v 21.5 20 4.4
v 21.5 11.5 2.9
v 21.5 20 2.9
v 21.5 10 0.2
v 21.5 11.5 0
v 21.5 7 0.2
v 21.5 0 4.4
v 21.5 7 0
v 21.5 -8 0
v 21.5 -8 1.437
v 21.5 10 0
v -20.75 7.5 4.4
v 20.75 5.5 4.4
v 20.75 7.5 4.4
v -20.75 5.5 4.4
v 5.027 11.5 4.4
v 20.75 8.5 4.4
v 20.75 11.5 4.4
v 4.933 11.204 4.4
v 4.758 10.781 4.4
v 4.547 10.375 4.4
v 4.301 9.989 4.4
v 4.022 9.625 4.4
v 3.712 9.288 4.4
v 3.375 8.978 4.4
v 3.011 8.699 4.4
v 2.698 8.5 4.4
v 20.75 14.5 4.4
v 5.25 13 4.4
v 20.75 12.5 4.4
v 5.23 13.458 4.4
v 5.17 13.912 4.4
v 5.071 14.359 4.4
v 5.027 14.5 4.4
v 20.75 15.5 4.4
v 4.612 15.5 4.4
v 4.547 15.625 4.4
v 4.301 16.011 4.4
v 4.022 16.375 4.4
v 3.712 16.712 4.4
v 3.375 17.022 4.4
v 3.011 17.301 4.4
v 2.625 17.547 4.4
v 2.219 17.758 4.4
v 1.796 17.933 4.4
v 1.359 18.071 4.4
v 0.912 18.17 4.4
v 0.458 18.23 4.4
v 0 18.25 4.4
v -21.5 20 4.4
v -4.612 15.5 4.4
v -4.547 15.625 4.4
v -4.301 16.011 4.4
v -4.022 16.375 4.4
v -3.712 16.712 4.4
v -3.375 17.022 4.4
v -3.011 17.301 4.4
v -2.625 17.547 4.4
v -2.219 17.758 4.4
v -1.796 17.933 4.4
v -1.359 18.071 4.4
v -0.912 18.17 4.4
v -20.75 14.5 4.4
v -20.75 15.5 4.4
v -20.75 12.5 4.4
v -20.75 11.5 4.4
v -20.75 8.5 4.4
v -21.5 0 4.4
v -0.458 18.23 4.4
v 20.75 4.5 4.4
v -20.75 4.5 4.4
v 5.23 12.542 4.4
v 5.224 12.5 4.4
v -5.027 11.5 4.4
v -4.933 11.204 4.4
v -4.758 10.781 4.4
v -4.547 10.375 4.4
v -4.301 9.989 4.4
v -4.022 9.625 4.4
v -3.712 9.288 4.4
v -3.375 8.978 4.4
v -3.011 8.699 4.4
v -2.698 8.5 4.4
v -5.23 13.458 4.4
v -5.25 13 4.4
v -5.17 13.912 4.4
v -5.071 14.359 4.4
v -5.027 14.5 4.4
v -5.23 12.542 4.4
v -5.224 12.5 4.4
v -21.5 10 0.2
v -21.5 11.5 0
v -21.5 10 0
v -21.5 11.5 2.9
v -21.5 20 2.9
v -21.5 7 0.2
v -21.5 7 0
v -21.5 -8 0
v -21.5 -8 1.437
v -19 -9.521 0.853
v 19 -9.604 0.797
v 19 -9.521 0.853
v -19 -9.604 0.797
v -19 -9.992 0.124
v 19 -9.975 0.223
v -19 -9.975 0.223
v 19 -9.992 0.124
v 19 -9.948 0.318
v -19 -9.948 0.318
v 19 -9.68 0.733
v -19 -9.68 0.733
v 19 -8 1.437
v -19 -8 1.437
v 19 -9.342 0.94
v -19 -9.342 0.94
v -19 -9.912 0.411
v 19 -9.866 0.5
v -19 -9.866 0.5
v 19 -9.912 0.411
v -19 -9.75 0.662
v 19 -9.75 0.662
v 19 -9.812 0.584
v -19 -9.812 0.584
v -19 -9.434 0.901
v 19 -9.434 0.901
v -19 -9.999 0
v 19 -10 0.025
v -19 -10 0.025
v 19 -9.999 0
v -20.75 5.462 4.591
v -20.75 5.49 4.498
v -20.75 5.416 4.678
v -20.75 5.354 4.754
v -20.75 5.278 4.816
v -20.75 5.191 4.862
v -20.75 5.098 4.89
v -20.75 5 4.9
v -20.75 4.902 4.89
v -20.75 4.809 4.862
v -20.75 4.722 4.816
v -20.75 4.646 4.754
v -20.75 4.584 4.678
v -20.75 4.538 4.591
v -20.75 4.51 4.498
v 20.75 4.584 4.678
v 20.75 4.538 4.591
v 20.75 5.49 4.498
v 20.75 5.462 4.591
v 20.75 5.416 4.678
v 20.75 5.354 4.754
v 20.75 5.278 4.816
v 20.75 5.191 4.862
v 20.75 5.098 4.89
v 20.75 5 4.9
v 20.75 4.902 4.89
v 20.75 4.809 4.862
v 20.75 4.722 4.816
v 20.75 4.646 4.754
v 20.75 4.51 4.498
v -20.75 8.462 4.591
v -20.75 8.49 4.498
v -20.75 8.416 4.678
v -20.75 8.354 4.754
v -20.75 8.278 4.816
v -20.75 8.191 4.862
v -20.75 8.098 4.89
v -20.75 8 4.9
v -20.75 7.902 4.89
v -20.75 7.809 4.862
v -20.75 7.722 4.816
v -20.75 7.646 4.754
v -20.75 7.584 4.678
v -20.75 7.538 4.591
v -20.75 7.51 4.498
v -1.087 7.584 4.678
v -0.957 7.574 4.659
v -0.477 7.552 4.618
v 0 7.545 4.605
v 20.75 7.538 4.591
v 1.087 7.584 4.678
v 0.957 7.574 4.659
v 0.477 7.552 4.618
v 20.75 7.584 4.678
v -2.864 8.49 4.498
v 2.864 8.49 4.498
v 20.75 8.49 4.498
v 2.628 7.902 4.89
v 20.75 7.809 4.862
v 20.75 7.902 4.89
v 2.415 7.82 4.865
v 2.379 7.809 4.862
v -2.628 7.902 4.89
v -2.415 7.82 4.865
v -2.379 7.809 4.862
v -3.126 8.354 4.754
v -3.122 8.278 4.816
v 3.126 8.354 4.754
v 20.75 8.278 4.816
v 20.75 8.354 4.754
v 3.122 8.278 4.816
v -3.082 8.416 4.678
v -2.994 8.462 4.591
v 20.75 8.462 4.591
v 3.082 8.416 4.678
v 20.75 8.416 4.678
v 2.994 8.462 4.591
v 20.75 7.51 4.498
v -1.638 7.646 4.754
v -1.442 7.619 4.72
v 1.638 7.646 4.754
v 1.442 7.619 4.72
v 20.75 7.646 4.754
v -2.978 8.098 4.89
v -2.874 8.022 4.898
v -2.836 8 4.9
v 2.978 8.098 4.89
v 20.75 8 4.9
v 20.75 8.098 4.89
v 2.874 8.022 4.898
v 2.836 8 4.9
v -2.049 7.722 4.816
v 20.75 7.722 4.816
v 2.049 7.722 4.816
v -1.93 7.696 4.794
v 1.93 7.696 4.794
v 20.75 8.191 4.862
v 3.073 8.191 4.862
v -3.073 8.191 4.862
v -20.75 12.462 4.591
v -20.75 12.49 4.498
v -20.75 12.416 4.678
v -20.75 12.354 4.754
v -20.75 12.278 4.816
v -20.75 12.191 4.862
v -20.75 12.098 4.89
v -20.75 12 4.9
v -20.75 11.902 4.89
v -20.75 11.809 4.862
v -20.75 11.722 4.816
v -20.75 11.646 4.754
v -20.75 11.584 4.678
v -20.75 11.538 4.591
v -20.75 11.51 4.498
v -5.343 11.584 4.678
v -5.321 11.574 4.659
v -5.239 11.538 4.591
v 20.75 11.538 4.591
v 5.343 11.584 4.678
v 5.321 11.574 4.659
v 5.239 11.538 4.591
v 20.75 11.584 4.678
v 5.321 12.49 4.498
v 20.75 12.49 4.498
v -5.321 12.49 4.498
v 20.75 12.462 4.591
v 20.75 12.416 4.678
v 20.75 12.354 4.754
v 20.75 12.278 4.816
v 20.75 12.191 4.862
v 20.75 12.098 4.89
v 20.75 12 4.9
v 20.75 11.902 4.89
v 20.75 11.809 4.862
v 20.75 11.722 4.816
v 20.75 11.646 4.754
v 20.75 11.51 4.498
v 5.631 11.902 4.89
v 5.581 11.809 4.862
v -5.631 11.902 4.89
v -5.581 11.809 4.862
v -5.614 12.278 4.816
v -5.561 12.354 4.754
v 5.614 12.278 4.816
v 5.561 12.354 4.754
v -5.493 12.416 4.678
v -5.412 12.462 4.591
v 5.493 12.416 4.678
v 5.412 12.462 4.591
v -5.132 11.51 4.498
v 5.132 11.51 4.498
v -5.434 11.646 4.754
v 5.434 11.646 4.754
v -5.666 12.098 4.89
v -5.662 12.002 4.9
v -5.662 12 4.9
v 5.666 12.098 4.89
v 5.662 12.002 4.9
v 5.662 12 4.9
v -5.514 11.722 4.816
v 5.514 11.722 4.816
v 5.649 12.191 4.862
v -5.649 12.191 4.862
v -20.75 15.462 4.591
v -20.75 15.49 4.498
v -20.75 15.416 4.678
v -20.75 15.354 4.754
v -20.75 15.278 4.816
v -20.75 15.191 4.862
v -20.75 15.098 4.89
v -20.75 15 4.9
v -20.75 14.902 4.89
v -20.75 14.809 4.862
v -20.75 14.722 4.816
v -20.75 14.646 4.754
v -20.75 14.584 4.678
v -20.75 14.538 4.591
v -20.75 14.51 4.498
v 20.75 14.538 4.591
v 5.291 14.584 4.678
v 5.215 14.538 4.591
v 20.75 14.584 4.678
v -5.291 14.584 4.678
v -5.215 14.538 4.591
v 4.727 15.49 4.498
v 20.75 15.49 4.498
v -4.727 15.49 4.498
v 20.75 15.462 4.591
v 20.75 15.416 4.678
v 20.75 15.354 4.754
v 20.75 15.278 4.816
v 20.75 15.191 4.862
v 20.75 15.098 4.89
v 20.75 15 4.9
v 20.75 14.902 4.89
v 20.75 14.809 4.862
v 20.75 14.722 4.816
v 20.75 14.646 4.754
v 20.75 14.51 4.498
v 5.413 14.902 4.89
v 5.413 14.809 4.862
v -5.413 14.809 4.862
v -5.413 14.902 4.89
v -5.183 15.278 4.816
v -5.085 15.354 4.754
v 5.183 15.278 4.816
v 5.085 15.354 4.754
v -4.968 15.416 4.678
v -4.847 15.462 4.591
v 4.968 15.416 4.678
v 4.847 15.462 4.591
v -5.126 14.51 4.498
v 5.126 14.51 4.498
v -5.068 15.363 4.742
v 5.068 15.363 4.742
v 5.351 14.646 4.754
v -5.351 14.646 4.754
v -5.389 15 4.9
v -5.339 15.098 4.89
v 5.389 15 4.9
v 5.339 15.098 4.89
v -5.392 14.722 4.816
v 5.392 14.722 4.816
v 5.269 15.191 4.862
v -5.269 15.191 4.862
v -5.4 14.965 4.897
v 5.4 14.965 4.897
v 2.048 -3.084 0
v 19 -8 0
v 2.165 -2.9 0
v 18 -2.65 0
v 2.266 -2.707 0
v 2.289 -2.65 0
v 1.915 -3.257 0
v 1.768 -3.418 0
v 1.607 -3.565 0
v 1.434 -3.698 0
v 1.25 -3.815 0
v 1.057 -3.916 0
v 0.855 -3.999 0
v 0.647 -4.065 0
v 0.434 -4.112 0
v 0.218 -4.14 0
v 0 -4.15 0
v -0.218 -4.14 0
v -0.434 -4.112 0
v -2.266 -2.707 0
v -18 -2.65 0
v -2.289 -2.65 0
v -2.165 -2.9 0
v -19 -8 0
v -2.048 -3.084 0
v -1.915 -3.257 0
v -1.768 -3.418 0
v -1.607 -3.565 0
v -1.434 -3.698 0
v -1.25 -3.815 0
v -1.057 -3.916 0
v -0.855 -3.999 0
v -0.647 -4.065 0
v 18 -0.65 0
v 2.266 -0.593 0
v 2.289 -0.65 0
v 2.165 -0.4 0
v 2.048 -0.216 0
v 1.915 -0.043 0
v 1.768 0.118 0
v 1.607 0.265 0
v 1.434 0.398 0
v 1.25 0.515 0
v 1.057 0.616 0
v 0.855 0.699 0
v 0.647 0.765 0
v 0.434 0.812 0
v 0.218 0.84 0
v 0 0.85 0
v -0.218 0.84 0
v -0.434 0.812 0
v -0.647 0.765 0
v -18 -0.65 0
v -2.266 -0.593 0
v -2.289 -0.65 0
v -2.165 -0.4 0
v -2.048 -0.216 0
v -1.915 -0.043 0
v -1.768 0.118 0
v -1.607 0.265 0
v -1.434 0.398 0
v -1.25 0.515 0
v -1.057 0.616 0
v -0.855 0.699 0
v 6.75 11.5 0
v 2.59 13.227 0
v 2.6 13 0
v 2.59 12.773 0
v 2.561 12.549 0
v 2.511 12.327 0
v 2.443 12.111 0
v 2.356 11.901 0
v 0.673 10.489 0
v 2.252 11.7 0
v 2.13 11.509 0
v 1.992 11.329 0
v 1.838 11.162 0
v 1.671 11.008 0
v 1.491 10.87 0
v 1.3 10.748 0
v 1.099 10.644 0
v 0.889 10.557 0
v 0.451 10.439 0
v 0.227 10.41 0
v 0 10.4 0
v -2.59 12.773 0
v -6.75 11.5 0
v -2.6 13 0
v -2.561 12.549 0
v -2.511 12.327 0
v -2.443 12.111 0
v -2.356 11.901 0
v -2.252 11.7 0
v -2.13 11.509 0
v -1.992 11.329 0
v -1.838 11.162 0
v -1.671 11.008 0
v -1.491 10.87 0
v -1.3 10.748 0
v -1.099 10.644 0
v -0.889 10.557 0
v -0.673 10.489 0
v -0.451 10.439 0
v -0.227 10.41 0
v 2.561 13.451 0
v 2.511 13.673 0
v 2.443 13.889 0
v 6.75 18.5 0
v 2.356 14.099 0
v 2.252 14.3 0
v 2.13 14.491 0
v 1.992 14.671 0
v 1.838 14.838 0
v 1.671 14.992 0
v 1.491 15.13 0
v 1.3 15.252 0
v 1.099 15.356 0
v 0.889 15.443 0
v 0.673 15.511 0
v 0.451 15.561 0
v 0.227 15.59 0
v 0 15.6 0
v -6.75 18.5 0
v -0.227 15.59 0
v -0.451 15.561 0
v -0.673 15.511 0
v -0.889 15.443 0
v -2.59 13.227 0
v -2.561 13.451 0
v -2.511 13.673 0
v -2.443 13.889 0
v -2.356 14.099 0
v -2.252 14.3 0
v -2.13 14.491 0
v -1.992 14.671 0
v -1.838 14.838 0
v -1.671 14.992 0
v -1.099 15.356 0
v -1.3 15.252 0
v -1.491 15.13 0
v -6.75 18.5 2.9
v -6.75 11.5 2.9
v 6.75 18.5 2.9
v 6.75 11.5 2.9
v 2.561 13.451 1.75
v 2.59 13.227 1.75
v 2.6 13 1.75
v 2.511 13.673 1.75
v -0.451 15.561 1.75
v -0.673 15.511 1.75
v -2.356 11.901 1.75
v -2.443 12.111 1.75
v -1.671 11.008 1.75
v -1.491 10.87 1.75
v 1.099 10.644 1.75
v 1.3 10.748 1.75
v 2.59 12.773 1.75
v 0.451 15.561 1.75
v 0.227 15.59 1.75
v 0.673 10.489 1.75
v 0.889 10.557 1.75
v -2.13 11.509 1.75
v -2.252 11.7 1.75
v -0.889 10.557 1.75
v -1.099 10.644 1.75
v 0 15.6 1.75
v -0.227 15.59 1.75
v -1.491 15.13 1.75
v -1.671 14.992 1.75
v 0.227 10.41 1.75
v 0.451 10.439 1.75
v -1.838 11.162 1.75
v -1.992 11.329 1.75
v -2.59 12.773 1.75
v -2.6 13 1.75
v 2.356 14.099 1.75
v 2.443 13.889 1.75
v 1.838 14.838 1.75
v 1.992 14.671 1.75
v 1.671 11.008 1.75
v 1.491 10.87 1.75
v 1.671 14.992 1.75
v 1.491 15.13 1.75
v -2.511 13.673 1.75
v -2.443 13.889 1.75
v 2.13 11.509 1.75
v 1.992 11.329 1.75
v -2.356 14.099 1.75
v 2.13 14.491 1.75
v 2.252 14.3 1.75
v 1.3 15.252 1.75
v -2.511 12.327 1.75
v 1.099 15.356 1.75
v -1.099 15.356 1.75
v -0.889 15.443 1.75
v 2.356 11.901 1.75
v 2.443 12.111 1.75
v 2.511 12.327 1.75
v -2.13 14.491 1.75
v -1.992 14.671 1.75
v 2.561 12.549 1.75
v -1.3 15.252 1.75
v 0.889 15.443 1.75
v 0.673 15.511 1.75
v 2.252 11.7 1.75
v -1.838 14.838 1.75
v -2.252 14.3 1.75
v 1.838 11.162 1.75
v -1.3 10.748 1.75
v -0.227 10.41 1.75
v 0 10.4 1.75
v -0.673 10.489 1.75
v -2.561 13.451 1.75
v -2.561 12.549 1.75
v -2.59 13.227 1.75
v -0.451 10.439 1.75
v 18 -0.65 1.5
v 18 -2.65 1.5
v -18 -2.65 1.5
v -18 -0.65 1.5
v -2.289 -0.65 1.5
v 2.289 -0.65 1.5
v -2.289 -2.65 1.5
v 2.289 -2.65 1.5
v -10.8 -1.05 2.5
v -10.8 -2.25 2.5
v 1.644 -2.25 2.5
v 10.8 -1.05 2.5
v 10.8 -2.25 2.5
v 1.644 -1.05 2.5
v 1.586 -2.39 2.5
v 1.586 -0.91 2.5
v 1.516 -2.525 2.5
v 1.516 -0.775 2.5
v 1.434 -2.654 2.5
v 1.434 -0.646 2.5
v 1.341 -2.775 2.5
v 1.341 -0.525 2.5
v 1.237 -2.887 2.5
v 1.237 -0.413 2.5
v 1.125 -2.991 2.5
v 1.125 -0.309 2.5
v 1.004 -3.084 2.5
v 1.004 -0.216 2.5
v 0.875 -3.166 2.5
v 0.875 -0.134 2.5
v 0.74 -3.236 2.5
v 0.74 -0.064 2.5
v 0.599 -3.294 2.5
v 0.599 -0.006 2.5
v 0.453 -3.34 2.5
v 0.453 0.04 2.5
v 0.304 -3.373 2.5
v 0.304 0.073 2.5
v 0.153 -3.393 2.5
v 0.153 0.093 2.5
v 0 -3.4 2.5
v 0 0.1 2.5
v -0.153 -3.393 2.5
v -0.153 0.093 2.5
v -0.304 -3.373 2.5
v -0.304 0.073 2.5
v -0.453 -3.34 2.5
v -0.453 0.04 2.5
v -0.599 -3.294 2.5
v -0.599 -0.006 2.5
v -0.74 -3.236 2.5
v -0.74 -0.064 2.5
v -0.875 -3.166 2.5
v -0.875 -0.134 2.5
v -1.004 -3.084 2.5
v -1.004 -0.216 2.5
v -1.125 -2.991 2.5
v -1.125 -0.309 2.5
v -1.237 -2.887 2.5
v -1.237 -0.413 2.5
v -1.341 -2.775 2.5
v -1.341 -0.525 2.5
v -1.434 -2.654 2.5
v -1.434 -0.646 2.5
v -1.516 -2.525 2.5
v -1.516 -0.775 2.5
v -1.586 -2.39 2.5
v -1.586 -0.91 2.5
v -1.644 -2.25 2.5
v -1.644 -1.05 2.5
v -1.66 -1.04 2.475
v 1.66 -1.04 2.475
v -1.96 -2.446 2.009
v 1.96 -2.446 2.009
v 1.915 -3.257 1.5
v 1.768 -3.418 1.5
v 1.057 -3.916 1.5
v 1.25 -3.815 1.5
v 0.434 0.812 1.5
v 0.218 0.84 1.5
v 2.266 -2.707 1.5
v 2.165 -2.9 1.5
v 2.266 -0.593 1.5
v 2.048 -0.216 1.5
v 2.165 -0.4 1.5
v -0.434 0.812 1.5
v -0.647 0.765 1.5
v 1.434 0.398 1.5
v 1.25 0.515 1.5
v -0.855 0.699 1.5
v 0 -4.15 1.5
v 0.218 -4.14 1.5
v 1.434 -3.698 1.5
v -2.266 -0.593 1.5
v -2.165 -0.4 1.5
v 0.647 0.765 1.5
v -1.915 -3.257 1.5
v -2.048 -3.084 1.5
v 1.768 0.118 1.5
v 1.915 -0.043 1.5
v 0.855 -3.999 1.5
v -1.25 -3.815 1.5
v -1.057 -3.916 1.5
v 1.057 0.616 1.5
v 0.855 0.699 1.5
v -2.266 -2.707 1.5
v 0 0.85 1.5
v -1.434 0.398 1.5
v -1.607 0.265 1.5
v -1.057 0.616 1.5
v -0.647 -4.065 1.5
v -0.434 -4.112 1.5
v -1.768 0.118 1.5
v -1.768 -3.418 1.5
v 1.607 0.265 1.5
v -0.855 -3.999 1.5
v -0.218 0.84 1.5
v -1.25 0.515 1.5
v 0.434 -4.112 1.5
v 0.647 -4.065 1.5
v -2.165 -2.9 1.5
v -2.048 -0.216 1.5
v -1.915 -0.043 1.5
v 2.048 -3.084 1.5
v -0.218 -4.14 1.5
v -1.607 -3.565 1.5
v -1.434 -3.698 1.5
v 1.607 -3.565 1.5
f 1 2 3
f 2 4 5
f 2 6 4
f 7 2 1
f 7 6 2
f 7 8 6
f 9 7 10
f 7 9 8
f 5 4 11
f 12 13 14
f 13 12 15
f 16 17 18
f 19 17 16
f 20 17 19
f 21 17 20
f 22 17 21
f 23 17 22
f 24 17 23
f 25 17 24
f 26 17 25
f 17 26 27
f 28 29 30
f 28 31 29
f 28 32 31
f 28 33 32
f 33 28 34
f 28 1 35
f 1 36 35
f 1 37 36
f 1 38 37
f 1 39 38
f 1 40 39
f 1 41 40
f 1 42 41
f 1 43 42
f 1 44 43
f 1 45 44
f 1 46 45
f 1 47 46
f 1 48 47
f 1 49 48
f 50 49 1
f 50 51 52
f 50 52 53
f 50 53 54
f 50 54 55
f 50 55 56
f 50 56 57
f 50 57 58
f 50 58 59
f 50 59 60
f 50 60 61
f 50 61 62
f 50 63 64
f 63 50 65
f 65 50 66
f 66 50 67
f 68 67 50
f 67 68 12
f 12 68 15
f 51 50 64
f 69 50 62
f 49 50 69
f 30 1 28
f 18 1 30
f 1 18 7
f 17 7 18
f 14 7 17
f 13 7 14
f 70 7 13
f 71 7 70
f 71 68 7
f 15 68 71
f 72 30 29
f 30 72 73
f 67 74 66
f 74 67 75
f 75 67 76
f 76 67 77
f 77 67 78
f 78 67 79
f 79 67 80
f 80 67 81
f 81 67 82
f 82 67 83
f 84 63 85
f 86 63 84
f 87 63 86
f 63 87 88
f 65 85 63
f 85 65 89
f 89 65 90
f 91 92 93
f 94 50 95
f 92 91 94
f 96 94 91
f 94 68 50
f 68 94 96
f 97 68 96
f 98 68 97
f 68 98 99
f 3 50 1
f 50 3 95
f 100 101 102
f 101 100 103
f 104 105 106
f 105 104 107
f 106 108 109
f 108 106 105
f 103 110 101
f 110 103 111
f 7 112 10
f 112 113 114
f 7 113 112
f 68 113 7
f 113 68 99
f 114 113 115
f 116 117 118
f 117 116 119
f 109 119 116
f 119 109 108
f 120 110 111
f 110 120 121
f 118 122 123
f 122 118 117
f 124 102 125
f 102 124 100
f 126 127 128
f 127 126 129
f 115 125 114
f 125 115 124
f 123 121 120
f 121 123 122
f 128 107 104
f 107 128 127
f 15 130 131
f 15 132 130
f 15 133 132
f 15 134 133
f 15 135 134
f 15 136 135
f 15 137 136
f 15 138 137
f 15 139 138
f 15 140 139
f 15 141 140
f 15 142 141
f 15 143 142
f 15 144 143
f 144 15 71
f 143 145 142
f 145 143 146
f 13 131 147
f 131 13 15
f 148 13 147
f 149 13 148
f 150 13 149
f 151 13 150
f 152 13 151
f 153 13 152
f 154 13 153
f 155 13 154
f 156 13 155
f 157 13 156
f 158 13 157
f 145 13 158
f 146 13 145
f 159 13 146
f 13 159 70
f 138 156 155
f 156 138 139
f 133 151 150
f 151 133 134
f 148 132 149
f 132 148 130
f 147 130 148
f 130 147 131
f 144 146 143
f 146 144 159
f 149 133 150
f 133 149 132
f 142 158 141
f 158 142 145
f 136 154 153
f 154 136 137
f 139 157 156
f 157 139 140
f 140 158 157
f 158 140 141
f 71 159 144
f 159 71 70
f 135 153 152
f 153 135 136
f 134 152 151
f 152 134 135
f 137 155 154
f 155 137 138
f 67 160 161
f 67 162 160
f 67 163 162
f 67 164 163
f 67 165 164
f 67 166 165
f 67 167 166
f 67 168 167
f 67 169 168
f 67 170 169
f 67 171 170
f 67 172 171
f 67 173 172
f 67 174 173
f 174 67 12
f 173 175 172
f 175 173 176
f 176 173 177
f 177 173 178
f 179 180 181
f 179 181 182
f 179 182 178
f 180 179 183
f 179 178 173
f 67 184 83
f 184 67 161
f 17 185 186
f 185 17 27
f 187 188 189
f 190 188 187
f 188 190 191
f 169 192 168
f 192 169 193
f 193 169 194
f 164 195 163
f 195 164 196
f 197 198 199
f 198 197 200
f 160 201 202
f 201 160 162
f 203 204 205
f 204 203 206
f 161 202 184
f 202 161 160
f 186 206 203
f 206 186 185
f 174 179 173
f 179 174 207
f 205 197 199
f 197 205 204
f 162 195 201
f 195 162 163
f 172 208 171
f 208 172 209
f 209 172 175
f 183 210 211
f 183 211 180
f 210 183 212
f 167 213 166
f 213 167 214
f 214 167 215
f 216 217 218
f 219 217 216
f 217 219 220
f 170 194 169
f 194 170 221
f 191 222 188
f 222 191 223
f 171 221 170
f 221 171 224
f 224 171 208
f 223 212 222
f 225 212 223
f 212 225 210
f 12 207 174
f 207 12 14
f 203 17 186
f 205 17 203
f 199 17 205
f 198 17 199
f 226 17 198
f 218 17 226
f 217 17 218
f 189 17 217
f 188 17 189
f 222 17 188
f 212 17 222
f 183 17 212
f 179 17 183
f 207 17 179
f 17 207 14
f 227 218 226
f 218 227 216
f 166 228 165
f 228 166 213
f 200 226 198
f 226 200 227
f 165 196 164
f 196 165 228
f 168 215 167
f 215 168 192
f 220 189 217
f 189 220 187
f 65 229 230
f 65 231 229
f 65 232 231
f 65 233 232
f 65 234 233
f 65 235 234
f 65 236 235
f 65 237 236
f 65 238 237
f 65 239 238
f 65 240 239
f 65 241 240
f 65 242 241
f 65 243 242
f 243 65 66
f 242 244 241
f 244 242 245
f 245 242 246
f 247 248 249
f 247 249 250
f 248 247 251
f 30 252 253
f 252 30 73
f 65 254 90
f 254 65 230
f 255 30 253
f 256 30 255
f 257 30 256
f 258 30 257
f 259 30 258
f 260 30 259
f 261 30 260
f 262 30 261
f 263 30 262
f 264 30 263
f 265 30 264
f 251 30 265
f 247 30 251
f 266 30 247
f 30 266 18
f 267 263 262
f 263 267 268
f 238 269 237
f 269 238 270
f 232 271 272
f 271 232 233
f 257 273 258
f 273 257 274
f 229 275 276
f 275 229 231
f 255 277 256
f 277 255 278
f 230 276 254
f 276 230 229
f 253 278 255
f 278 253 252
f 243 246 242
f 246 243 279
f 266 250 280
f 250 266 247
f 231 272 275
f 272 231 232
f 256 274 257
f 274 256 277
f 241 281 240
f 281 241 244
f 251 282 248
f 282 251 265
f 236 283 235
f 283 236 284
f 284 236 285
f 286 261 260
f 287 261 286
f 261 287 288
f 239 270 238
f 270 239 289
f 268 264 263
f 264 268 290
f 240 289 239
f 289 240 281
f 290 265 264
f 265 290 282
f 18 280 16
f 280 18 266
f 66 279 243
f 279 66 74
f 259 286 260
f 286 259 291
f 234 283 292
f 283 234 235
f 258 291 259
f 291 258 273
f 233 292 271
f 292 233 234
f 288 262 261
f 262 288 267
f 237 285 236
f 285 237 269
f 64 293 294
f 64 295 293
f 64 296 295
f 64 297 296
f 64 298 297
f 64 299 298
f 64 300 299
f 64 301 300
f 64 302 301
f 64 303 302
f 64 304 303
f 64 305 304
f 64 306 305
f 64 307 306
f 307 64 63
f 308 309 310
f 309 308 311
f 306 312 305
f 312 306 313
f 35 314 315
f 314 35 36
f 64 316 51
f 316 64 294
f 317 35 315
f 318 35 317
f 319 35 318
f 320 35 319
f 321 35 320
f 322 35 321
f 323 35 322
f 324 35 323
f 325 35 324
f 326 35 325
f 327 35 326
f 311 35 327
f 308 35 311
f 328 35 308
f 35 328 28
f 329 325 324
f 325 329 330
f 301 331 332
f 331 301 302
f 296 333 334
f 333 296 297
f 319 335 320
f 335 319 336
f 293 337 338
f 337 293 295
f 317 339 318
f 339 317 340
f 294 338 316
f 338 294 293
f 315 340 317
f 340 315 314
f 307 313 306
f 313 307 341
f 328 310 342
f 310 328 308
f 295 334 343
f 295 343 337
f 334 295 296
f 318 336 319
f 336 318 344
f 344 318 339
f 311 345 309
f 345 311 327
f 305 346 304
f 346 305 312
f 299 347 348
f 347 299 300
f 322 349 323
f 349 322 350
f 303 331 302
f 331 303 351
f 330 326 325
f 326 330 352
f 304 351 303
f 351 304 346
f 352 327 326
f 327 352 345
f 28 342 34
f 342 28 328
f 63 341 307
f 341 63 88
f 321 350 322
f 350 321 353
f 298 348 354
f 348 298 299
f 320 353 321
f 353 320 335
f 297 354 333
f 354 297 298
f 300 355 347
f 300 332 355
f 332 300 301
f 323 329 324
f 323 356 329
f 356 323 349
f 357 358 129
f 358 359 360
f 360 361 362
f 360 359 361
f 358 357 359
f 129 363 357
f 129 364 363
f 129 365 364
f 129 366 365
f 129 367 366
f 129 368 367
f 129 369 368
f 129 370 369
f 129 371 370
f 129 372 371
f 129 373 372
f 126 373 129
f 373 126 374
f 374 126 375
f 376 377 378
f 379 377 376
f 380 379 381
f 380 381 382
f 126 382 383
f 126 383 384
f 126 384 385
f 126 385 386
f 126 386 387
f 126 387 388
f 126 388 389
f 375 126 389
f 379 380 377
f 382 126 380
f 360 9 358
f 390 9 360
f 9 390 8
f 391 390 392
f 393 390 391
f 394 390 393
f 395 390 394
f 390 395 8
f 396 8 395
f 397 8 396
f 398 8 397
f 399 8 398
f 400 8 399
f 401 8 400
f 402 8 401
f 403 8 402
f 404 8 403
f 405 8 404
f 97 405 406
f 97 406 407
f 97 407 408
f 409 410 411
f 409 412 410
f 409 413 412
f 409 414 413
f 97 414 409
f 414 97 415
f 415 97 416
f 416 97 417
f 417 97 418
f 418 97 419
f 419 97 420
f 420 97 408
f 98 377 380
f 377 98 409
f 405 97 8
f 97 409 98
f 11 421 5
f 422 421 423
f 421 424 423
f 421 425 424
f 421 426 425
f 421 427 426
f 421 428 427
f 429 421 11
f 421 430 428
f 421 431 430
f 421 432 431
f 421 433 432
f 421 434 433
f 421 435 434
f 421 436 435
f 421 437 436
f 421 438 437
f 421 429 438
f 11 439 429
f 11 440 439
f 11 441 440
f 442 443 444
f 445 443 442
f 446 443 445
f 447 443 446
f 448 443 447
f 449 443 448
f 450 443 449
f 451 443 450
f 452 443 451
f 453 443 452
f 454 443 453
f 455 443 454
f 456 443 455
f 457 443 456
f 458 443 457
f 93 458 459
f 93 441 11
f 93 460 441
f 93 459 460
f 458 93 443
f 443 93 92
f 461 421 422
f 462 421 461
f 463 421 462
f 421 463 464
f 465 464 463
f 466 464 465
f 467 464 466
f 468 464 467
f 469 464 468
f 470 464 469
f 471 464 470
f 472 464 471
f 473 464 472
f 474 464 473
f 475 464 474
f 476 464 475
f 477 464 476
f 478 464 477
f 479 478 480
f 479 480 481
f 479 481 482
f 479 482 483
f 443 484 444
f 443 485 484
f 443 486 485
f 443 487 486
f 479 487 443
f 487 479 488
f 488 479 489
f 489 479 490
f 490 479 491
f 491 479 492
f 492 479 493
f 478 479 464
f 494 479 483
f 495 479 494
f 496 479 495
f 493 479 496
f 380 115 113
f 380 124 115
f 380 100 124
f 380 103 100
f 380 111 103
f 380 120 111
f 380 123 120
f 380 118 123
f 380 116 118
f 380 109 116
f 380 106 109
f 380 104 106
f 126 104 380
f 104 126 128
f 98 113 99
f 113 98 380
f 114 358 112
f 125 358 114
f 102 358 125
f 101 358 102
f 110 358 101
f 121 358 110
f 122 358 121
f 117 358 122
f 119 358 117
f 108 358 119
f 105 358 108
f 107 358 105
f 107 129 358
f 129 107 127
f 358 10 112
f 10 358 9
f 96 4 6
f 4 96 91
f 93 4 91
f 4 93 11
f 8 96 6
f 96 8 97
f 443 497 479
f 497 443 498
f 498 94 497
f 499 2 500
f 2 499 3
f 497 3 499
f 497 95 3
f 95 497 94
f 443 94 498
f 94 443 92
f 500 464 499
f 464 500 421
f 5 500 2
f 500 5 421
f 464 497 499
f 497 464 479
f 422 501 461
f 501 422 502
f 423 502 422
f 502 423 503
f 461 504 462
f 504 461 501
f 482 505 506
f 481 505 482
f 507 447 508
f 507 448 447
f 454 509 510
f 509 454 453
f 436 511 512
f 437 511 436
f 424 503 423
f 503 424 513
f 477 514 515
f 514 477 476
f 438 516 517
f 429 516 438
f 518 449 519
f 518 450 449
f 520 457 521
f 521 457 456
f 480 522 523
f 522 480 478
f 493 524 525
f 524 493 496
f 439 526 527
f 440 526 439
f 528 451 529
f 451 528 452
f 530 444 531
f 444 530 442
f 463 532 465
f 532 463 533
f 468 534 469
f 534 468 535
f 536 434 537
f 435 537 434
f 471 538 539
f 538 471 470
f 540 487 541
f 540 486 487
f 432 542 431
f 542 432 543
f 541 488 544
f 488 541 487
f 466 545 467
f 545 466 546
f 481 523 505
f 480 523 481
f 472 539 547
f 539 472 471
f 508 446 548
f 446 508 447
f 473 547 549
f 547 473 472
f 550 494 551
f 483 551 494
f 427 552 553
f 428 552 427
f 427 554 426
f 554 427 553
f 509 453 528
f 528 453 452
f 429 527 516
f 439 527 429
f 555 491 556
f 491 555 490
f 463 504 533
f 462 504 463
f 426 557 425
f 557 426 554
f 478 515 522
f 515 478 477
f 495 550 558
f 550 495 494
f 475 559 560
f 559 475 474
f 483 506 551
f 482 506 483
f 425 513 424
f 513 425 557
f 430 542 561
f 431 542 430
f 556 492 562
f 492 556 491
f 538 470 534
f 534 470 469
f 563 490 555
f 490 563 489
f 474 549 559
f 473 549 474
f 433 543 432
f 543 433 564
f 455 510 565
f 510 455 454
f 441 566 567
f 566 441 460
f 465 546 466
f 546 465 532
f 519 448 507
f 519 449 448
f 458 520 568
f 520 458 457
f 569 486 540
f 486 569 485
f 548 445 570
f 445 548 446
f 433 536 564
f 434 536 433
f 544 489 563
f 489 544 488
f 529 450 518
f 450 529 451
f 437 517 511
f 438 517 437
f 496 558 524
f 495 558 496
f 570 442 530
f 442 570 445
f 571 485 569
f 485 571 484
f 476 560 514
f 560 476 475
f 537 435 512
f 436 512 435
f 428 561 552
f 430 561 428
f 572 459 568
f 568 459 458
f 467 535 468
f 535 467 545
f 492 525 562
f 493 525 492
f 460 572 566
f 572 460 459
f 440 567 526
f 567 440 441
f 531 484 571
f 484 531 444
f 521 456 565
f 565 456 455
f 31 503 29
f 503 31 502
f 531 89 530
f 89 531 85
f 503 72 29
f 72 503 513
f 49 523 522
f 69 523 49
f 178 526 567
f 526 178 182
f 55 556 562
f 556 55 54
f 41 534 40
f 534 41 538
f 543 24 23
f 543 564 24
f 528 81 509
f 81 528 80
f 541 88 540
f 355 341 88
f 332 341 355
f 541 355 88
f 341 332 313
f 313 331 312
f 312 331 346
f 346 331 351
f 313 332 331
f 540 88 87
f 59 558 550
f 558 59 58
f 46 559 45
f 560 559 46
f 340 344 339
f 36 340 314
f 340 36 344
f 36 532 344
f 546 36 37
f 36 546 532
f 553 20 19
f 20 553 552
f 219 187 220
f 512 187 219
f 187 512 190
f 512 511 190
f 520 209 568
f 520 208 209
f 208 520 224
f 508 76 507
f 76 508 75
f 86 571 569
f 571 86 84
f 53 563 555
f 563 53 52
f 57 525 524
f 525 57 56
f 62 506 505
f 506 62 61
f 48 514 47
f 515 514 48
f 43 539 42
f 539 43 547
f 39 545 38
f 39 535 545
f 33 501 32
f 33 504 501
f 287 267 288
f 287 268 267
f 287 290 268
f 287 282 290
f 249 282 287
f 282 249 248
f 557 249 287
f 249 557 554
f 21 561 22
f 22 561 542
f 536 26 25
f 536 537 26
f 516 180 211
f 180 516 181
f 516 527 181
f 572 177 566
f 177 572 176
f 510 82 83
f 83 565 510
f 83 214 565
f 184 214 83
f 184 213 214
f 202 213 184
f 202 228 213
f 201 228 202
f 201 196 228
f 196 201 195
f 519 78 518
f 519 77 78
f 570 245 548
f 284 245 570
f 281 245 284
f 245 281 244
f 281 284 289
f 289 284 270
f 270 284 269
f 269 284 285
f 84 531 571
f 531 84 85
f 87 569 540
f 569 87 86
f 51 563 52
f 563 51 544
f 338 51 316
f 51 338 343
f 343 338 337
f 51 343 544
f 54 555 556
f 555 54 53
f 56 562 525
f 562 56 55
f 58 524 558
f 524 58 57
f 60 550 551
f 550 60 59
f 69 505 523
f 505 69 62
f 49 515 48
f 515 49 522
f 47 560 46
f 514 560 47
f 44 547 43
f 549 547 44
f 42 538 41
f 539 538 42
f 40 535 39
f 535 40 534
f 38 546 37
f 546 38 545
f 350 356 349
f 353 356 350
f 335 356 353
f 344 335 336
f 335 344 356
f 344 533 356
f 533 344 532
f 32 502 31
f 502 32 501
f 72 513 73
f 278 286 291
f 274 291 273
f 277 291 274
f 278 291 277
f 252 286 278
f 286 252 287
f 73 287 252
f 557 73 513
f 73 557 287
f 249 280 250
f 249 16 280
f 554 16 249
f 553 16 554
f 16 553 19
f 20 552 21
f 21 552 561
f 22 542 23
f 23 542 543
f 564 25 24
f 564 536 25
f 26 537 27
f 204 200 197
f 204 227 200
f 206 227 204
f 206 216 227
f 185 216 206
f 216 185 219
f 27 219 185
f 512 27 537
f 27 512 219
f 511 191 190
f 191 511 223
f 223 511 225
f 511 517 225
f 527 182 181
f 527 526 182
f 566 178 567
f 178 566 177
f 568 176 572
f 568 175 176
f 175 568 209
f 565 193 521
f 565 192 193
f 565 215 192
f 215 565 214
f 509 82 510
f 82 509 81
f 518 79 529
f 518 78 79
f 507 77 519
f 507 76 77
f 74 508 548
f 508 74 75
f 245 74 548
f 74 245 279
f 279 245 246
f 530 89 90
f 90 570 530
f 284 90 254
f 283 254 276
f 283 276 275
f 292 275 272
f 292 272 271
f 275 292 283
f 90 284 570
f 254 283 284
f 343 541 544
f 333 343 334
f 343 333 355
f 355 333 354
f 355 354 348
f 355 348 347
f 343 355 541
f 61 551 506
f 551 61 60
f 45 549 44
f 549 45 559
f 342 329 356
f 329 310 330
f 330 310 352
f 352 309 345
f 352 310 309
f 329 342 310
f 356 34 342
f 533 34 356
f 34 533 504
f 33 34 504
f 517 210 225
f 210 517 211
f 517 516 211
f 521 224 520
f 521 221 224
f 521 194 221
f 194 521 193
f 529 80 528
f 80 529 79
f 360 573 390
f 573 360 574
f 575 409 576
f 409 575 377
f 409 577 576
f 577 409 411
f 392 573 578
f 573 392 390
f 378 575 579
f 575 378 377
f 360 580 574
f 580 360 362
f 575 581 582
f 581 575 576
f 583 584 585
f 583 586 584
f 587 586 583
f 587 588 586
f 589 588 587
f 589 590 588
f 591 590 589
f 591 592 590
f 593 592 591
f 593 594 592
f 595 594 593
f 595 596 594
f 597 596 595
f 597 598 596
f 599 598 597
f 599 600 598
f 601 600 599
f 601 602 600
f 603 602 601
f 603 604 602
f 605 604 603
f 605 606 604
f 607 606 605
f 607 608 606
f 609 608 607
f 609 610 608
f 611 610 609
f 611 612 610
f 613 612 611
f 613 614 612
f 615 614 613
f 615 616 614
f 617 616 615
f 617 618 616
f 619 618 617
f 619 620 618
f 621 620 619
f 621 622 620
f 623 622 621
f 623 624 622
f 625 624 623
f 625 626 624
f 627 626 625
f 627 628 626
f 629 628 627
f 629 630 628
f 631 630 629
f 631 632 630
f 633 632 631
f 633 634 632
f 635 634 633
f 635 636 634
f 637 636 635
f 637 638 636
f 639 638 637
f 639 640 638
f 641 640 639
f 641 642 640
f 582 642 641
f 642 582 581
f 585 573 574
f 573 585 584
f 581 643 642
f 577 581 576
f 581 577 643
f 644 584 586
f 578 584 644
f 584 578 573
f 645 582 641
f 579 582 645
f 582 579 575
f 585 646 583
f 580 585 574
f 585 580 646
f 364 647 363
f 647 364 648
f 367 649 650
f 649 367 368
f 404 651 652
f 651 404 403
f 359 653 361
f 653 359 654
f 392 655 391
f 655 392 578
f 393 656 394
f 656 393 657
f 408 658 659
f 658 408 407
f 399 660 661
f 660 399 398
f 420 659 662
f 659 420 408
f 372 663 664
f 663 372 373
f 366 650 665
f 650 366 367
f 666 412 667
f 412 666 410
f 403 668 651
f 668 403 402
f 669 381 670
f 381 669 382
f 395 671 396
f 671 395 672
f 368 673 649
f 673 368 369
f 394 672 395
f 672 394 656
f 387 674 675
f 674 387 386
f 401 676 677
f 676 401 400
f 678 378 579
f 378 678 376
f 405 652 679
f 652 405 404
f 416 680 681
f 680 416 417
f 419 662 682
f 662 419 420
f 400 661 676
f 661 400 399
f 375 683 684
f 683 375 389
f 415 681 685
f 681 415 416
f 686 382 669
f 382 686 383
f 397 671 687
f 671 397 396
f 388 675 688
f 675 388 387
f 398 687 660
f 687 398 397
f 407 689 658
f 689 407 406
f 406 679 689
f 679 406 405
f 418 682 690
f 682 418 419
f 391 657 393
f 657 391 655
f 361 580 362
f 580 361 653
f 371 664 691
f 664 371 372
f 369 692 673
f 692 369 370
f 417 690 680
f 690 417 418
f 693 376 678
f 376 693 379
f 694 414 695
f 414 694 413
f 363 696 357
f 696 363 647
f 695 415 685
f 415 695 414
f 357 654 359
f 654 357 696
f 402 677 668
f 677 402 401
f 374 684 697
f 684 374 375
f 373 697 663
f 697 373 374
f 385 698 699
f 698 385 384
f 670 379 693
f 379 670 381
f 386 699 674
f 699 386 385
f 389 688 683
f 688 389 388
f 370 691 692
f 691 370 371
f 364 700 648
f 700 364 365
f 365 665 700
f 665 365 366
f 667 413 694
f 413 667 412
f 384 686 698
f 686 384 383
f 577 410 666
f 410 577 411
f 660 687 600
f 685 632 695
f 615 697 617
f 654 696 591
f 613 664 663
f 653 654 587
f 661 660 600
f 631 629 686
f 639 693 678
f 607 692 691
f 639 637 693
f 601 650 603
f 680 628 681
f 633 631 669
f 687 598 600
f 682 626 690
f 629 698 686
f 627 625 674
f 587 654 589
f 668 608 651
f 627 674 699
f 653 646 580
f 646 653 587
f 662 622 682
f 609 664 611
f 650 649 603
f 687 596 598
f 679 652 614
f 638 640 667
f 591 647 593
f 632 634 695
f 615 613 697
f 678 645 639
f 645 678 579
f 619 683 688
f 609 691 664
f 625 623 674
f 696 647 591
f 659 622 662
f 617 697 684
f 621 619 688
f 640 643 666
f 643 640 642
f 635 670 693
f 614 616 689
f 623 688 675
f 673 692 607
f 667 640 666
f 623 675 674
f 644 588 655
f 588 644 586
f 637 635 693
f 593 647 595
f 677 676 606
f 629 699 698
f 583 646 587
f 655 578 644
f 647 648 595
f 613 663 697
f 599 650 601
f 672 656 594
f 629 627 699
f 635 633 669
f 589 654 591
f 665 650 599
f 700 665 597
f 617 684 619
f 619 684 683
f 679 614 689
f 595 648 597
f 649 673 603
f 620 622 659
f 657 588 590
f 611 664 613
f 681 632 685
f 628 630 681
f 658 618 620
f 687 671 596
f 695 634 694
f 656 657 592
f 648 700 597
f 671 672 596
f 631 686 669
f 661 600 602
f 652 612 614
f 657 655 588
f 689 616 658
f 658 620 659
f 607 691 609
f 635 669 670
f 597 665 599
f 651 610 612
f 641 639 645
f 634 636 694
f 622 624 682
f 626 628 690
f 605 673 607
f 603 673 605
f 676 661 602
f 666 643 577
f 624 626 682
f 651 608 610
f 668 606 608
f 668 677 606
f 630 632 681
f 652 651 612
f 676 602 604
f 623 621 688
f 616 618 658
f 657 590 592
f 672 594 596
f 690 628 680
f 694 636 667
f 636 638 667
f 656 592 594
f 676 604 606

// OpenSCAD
// Razor holder: lid

margin = 1.5;
echo("margin:", margin);

// Global resolution
$fs = 0.1;  // Don't generate smaller facets than 0.1 mm
$fa = 5;    // Don't generate larger angles than 5 degrees

width = 43;    // width of the blade
height = 8.8;  // length of screw (6mm thread + 2.8mm head)
stem = 2.5;    // length of stems for half blades
screwW = 10.5; // 10mm + space for rounded edge
screwH = 2.8;  // 2.8mm from Amazon product page
bolt = 5.2;    // 5mm + space
thick = height/2 - screwH;
echo("thickness at screw head:", thick);

// from https://www.badgerandblade.com/forum/wiki/Double-Edge_DE_Razor_Blade_Dimensions_Table
tab = 12.7;      // maximum length of blunt edges standing out to the side
blade = 22;      // maximum length of shorter side of a blade
cutoutLen = 36;  // minimum length of cutout in blades
cutoutWidth = 2; // minimum width of cutout in blades
circ = 5;        // minimum diameter of circle shaped cutouts in blades
mid = tab/2 - 8;


lid();

module lid() {
  difference() {
    base();
    translate([0,mid,0])
      cube([cutoutLen,cutoutWidth,3],center=true); // cutout block base
    translate([0,mid,2])
      linear_extrude(height=1,center=true,scale=0.6)
      square([cutoutLen,cutoutWidth],center=true); // cutout block top
    translate([0, mid,0])
      cylinder(h=3,d=circ,center=true); // cutout circle base
    translate([0,mid,2])
      linear_extrude(height=1,center=true,scale=0.7) // cutout circle top
      circle(d=circ);
  }
}

module base() {
  safeX1 = width/2;           // outermost point of safe cutout
  safeX2 = screwW/2 + margin;   // innermost point of safe cutout
  safeWidth = safeX1 -safeX2; // width of safe cutout
  safeLen = 10 - margin*2;    // length of safe cutout

  difference() {
    baseFull();
    translate([0,0,-5])
      cube([100,50,10],center=true);  // remove lower side
    translate([-width/2,-10,0])
      cube([5,4,height],center=true); // left stem
    translate([width/2,-10,0])
      cube([5,4,height],center=true); // right stem
    translate([0,8.5,0])
      cube([width+2,3,0.4],center=true); // edge protection
    translate([-safeX2-safeWidth/2-1,20-margin-safeLen/2+1,-margin])
      cube([safeWidth+2, safeLen+2, height], center=true); // saving material (1)
    translate([safeX2+safeWidth/2+1,20-margin-safeLen/2+1,-margin])
      cube([safeWidth+2, safeLen+2, height], center=true); // saving material (2)
    translate([0,20,height/4-margin])
      cube([width+2, margin*2, height/2], center=true); // lid rest
    translate([0,blade/2+2,0])
      cylinder(h=height*2,d=bolt,center=true); // bolt
    translate([0,blade/2+2,height/2])
      cylinder(h=screwW,d1=0,d2=screwW*2,center=true); // screw head
  }
}

module baseFull() {
  union() {
    translate([0,10,0])
      block();
    color("Red") wedge();
    translate([0,5,height/2])
      grip();
    translate([0,8,height/2])
      grip();
    translate([0,12,height/2])
      grip();
    translate([0,15,height/2])
      grip();
  }
}

module grip() {
  color("Blue") rotate([0,90,0])
    cylinder(h=width-margin,d=1,center=true);
}

module block() {
  l = 20;
  cube([width,l,height],true);
}

module wedge() {
  union() {
    translate([-width/2,0,0])
      rotate([0,90,0])
      linear_extrude(height=width, center=false, twist=0)
      hull() {
        square([height,0.0001],true);
        translate([0,-9,0]) circle(r=1);
      }
  }
}
